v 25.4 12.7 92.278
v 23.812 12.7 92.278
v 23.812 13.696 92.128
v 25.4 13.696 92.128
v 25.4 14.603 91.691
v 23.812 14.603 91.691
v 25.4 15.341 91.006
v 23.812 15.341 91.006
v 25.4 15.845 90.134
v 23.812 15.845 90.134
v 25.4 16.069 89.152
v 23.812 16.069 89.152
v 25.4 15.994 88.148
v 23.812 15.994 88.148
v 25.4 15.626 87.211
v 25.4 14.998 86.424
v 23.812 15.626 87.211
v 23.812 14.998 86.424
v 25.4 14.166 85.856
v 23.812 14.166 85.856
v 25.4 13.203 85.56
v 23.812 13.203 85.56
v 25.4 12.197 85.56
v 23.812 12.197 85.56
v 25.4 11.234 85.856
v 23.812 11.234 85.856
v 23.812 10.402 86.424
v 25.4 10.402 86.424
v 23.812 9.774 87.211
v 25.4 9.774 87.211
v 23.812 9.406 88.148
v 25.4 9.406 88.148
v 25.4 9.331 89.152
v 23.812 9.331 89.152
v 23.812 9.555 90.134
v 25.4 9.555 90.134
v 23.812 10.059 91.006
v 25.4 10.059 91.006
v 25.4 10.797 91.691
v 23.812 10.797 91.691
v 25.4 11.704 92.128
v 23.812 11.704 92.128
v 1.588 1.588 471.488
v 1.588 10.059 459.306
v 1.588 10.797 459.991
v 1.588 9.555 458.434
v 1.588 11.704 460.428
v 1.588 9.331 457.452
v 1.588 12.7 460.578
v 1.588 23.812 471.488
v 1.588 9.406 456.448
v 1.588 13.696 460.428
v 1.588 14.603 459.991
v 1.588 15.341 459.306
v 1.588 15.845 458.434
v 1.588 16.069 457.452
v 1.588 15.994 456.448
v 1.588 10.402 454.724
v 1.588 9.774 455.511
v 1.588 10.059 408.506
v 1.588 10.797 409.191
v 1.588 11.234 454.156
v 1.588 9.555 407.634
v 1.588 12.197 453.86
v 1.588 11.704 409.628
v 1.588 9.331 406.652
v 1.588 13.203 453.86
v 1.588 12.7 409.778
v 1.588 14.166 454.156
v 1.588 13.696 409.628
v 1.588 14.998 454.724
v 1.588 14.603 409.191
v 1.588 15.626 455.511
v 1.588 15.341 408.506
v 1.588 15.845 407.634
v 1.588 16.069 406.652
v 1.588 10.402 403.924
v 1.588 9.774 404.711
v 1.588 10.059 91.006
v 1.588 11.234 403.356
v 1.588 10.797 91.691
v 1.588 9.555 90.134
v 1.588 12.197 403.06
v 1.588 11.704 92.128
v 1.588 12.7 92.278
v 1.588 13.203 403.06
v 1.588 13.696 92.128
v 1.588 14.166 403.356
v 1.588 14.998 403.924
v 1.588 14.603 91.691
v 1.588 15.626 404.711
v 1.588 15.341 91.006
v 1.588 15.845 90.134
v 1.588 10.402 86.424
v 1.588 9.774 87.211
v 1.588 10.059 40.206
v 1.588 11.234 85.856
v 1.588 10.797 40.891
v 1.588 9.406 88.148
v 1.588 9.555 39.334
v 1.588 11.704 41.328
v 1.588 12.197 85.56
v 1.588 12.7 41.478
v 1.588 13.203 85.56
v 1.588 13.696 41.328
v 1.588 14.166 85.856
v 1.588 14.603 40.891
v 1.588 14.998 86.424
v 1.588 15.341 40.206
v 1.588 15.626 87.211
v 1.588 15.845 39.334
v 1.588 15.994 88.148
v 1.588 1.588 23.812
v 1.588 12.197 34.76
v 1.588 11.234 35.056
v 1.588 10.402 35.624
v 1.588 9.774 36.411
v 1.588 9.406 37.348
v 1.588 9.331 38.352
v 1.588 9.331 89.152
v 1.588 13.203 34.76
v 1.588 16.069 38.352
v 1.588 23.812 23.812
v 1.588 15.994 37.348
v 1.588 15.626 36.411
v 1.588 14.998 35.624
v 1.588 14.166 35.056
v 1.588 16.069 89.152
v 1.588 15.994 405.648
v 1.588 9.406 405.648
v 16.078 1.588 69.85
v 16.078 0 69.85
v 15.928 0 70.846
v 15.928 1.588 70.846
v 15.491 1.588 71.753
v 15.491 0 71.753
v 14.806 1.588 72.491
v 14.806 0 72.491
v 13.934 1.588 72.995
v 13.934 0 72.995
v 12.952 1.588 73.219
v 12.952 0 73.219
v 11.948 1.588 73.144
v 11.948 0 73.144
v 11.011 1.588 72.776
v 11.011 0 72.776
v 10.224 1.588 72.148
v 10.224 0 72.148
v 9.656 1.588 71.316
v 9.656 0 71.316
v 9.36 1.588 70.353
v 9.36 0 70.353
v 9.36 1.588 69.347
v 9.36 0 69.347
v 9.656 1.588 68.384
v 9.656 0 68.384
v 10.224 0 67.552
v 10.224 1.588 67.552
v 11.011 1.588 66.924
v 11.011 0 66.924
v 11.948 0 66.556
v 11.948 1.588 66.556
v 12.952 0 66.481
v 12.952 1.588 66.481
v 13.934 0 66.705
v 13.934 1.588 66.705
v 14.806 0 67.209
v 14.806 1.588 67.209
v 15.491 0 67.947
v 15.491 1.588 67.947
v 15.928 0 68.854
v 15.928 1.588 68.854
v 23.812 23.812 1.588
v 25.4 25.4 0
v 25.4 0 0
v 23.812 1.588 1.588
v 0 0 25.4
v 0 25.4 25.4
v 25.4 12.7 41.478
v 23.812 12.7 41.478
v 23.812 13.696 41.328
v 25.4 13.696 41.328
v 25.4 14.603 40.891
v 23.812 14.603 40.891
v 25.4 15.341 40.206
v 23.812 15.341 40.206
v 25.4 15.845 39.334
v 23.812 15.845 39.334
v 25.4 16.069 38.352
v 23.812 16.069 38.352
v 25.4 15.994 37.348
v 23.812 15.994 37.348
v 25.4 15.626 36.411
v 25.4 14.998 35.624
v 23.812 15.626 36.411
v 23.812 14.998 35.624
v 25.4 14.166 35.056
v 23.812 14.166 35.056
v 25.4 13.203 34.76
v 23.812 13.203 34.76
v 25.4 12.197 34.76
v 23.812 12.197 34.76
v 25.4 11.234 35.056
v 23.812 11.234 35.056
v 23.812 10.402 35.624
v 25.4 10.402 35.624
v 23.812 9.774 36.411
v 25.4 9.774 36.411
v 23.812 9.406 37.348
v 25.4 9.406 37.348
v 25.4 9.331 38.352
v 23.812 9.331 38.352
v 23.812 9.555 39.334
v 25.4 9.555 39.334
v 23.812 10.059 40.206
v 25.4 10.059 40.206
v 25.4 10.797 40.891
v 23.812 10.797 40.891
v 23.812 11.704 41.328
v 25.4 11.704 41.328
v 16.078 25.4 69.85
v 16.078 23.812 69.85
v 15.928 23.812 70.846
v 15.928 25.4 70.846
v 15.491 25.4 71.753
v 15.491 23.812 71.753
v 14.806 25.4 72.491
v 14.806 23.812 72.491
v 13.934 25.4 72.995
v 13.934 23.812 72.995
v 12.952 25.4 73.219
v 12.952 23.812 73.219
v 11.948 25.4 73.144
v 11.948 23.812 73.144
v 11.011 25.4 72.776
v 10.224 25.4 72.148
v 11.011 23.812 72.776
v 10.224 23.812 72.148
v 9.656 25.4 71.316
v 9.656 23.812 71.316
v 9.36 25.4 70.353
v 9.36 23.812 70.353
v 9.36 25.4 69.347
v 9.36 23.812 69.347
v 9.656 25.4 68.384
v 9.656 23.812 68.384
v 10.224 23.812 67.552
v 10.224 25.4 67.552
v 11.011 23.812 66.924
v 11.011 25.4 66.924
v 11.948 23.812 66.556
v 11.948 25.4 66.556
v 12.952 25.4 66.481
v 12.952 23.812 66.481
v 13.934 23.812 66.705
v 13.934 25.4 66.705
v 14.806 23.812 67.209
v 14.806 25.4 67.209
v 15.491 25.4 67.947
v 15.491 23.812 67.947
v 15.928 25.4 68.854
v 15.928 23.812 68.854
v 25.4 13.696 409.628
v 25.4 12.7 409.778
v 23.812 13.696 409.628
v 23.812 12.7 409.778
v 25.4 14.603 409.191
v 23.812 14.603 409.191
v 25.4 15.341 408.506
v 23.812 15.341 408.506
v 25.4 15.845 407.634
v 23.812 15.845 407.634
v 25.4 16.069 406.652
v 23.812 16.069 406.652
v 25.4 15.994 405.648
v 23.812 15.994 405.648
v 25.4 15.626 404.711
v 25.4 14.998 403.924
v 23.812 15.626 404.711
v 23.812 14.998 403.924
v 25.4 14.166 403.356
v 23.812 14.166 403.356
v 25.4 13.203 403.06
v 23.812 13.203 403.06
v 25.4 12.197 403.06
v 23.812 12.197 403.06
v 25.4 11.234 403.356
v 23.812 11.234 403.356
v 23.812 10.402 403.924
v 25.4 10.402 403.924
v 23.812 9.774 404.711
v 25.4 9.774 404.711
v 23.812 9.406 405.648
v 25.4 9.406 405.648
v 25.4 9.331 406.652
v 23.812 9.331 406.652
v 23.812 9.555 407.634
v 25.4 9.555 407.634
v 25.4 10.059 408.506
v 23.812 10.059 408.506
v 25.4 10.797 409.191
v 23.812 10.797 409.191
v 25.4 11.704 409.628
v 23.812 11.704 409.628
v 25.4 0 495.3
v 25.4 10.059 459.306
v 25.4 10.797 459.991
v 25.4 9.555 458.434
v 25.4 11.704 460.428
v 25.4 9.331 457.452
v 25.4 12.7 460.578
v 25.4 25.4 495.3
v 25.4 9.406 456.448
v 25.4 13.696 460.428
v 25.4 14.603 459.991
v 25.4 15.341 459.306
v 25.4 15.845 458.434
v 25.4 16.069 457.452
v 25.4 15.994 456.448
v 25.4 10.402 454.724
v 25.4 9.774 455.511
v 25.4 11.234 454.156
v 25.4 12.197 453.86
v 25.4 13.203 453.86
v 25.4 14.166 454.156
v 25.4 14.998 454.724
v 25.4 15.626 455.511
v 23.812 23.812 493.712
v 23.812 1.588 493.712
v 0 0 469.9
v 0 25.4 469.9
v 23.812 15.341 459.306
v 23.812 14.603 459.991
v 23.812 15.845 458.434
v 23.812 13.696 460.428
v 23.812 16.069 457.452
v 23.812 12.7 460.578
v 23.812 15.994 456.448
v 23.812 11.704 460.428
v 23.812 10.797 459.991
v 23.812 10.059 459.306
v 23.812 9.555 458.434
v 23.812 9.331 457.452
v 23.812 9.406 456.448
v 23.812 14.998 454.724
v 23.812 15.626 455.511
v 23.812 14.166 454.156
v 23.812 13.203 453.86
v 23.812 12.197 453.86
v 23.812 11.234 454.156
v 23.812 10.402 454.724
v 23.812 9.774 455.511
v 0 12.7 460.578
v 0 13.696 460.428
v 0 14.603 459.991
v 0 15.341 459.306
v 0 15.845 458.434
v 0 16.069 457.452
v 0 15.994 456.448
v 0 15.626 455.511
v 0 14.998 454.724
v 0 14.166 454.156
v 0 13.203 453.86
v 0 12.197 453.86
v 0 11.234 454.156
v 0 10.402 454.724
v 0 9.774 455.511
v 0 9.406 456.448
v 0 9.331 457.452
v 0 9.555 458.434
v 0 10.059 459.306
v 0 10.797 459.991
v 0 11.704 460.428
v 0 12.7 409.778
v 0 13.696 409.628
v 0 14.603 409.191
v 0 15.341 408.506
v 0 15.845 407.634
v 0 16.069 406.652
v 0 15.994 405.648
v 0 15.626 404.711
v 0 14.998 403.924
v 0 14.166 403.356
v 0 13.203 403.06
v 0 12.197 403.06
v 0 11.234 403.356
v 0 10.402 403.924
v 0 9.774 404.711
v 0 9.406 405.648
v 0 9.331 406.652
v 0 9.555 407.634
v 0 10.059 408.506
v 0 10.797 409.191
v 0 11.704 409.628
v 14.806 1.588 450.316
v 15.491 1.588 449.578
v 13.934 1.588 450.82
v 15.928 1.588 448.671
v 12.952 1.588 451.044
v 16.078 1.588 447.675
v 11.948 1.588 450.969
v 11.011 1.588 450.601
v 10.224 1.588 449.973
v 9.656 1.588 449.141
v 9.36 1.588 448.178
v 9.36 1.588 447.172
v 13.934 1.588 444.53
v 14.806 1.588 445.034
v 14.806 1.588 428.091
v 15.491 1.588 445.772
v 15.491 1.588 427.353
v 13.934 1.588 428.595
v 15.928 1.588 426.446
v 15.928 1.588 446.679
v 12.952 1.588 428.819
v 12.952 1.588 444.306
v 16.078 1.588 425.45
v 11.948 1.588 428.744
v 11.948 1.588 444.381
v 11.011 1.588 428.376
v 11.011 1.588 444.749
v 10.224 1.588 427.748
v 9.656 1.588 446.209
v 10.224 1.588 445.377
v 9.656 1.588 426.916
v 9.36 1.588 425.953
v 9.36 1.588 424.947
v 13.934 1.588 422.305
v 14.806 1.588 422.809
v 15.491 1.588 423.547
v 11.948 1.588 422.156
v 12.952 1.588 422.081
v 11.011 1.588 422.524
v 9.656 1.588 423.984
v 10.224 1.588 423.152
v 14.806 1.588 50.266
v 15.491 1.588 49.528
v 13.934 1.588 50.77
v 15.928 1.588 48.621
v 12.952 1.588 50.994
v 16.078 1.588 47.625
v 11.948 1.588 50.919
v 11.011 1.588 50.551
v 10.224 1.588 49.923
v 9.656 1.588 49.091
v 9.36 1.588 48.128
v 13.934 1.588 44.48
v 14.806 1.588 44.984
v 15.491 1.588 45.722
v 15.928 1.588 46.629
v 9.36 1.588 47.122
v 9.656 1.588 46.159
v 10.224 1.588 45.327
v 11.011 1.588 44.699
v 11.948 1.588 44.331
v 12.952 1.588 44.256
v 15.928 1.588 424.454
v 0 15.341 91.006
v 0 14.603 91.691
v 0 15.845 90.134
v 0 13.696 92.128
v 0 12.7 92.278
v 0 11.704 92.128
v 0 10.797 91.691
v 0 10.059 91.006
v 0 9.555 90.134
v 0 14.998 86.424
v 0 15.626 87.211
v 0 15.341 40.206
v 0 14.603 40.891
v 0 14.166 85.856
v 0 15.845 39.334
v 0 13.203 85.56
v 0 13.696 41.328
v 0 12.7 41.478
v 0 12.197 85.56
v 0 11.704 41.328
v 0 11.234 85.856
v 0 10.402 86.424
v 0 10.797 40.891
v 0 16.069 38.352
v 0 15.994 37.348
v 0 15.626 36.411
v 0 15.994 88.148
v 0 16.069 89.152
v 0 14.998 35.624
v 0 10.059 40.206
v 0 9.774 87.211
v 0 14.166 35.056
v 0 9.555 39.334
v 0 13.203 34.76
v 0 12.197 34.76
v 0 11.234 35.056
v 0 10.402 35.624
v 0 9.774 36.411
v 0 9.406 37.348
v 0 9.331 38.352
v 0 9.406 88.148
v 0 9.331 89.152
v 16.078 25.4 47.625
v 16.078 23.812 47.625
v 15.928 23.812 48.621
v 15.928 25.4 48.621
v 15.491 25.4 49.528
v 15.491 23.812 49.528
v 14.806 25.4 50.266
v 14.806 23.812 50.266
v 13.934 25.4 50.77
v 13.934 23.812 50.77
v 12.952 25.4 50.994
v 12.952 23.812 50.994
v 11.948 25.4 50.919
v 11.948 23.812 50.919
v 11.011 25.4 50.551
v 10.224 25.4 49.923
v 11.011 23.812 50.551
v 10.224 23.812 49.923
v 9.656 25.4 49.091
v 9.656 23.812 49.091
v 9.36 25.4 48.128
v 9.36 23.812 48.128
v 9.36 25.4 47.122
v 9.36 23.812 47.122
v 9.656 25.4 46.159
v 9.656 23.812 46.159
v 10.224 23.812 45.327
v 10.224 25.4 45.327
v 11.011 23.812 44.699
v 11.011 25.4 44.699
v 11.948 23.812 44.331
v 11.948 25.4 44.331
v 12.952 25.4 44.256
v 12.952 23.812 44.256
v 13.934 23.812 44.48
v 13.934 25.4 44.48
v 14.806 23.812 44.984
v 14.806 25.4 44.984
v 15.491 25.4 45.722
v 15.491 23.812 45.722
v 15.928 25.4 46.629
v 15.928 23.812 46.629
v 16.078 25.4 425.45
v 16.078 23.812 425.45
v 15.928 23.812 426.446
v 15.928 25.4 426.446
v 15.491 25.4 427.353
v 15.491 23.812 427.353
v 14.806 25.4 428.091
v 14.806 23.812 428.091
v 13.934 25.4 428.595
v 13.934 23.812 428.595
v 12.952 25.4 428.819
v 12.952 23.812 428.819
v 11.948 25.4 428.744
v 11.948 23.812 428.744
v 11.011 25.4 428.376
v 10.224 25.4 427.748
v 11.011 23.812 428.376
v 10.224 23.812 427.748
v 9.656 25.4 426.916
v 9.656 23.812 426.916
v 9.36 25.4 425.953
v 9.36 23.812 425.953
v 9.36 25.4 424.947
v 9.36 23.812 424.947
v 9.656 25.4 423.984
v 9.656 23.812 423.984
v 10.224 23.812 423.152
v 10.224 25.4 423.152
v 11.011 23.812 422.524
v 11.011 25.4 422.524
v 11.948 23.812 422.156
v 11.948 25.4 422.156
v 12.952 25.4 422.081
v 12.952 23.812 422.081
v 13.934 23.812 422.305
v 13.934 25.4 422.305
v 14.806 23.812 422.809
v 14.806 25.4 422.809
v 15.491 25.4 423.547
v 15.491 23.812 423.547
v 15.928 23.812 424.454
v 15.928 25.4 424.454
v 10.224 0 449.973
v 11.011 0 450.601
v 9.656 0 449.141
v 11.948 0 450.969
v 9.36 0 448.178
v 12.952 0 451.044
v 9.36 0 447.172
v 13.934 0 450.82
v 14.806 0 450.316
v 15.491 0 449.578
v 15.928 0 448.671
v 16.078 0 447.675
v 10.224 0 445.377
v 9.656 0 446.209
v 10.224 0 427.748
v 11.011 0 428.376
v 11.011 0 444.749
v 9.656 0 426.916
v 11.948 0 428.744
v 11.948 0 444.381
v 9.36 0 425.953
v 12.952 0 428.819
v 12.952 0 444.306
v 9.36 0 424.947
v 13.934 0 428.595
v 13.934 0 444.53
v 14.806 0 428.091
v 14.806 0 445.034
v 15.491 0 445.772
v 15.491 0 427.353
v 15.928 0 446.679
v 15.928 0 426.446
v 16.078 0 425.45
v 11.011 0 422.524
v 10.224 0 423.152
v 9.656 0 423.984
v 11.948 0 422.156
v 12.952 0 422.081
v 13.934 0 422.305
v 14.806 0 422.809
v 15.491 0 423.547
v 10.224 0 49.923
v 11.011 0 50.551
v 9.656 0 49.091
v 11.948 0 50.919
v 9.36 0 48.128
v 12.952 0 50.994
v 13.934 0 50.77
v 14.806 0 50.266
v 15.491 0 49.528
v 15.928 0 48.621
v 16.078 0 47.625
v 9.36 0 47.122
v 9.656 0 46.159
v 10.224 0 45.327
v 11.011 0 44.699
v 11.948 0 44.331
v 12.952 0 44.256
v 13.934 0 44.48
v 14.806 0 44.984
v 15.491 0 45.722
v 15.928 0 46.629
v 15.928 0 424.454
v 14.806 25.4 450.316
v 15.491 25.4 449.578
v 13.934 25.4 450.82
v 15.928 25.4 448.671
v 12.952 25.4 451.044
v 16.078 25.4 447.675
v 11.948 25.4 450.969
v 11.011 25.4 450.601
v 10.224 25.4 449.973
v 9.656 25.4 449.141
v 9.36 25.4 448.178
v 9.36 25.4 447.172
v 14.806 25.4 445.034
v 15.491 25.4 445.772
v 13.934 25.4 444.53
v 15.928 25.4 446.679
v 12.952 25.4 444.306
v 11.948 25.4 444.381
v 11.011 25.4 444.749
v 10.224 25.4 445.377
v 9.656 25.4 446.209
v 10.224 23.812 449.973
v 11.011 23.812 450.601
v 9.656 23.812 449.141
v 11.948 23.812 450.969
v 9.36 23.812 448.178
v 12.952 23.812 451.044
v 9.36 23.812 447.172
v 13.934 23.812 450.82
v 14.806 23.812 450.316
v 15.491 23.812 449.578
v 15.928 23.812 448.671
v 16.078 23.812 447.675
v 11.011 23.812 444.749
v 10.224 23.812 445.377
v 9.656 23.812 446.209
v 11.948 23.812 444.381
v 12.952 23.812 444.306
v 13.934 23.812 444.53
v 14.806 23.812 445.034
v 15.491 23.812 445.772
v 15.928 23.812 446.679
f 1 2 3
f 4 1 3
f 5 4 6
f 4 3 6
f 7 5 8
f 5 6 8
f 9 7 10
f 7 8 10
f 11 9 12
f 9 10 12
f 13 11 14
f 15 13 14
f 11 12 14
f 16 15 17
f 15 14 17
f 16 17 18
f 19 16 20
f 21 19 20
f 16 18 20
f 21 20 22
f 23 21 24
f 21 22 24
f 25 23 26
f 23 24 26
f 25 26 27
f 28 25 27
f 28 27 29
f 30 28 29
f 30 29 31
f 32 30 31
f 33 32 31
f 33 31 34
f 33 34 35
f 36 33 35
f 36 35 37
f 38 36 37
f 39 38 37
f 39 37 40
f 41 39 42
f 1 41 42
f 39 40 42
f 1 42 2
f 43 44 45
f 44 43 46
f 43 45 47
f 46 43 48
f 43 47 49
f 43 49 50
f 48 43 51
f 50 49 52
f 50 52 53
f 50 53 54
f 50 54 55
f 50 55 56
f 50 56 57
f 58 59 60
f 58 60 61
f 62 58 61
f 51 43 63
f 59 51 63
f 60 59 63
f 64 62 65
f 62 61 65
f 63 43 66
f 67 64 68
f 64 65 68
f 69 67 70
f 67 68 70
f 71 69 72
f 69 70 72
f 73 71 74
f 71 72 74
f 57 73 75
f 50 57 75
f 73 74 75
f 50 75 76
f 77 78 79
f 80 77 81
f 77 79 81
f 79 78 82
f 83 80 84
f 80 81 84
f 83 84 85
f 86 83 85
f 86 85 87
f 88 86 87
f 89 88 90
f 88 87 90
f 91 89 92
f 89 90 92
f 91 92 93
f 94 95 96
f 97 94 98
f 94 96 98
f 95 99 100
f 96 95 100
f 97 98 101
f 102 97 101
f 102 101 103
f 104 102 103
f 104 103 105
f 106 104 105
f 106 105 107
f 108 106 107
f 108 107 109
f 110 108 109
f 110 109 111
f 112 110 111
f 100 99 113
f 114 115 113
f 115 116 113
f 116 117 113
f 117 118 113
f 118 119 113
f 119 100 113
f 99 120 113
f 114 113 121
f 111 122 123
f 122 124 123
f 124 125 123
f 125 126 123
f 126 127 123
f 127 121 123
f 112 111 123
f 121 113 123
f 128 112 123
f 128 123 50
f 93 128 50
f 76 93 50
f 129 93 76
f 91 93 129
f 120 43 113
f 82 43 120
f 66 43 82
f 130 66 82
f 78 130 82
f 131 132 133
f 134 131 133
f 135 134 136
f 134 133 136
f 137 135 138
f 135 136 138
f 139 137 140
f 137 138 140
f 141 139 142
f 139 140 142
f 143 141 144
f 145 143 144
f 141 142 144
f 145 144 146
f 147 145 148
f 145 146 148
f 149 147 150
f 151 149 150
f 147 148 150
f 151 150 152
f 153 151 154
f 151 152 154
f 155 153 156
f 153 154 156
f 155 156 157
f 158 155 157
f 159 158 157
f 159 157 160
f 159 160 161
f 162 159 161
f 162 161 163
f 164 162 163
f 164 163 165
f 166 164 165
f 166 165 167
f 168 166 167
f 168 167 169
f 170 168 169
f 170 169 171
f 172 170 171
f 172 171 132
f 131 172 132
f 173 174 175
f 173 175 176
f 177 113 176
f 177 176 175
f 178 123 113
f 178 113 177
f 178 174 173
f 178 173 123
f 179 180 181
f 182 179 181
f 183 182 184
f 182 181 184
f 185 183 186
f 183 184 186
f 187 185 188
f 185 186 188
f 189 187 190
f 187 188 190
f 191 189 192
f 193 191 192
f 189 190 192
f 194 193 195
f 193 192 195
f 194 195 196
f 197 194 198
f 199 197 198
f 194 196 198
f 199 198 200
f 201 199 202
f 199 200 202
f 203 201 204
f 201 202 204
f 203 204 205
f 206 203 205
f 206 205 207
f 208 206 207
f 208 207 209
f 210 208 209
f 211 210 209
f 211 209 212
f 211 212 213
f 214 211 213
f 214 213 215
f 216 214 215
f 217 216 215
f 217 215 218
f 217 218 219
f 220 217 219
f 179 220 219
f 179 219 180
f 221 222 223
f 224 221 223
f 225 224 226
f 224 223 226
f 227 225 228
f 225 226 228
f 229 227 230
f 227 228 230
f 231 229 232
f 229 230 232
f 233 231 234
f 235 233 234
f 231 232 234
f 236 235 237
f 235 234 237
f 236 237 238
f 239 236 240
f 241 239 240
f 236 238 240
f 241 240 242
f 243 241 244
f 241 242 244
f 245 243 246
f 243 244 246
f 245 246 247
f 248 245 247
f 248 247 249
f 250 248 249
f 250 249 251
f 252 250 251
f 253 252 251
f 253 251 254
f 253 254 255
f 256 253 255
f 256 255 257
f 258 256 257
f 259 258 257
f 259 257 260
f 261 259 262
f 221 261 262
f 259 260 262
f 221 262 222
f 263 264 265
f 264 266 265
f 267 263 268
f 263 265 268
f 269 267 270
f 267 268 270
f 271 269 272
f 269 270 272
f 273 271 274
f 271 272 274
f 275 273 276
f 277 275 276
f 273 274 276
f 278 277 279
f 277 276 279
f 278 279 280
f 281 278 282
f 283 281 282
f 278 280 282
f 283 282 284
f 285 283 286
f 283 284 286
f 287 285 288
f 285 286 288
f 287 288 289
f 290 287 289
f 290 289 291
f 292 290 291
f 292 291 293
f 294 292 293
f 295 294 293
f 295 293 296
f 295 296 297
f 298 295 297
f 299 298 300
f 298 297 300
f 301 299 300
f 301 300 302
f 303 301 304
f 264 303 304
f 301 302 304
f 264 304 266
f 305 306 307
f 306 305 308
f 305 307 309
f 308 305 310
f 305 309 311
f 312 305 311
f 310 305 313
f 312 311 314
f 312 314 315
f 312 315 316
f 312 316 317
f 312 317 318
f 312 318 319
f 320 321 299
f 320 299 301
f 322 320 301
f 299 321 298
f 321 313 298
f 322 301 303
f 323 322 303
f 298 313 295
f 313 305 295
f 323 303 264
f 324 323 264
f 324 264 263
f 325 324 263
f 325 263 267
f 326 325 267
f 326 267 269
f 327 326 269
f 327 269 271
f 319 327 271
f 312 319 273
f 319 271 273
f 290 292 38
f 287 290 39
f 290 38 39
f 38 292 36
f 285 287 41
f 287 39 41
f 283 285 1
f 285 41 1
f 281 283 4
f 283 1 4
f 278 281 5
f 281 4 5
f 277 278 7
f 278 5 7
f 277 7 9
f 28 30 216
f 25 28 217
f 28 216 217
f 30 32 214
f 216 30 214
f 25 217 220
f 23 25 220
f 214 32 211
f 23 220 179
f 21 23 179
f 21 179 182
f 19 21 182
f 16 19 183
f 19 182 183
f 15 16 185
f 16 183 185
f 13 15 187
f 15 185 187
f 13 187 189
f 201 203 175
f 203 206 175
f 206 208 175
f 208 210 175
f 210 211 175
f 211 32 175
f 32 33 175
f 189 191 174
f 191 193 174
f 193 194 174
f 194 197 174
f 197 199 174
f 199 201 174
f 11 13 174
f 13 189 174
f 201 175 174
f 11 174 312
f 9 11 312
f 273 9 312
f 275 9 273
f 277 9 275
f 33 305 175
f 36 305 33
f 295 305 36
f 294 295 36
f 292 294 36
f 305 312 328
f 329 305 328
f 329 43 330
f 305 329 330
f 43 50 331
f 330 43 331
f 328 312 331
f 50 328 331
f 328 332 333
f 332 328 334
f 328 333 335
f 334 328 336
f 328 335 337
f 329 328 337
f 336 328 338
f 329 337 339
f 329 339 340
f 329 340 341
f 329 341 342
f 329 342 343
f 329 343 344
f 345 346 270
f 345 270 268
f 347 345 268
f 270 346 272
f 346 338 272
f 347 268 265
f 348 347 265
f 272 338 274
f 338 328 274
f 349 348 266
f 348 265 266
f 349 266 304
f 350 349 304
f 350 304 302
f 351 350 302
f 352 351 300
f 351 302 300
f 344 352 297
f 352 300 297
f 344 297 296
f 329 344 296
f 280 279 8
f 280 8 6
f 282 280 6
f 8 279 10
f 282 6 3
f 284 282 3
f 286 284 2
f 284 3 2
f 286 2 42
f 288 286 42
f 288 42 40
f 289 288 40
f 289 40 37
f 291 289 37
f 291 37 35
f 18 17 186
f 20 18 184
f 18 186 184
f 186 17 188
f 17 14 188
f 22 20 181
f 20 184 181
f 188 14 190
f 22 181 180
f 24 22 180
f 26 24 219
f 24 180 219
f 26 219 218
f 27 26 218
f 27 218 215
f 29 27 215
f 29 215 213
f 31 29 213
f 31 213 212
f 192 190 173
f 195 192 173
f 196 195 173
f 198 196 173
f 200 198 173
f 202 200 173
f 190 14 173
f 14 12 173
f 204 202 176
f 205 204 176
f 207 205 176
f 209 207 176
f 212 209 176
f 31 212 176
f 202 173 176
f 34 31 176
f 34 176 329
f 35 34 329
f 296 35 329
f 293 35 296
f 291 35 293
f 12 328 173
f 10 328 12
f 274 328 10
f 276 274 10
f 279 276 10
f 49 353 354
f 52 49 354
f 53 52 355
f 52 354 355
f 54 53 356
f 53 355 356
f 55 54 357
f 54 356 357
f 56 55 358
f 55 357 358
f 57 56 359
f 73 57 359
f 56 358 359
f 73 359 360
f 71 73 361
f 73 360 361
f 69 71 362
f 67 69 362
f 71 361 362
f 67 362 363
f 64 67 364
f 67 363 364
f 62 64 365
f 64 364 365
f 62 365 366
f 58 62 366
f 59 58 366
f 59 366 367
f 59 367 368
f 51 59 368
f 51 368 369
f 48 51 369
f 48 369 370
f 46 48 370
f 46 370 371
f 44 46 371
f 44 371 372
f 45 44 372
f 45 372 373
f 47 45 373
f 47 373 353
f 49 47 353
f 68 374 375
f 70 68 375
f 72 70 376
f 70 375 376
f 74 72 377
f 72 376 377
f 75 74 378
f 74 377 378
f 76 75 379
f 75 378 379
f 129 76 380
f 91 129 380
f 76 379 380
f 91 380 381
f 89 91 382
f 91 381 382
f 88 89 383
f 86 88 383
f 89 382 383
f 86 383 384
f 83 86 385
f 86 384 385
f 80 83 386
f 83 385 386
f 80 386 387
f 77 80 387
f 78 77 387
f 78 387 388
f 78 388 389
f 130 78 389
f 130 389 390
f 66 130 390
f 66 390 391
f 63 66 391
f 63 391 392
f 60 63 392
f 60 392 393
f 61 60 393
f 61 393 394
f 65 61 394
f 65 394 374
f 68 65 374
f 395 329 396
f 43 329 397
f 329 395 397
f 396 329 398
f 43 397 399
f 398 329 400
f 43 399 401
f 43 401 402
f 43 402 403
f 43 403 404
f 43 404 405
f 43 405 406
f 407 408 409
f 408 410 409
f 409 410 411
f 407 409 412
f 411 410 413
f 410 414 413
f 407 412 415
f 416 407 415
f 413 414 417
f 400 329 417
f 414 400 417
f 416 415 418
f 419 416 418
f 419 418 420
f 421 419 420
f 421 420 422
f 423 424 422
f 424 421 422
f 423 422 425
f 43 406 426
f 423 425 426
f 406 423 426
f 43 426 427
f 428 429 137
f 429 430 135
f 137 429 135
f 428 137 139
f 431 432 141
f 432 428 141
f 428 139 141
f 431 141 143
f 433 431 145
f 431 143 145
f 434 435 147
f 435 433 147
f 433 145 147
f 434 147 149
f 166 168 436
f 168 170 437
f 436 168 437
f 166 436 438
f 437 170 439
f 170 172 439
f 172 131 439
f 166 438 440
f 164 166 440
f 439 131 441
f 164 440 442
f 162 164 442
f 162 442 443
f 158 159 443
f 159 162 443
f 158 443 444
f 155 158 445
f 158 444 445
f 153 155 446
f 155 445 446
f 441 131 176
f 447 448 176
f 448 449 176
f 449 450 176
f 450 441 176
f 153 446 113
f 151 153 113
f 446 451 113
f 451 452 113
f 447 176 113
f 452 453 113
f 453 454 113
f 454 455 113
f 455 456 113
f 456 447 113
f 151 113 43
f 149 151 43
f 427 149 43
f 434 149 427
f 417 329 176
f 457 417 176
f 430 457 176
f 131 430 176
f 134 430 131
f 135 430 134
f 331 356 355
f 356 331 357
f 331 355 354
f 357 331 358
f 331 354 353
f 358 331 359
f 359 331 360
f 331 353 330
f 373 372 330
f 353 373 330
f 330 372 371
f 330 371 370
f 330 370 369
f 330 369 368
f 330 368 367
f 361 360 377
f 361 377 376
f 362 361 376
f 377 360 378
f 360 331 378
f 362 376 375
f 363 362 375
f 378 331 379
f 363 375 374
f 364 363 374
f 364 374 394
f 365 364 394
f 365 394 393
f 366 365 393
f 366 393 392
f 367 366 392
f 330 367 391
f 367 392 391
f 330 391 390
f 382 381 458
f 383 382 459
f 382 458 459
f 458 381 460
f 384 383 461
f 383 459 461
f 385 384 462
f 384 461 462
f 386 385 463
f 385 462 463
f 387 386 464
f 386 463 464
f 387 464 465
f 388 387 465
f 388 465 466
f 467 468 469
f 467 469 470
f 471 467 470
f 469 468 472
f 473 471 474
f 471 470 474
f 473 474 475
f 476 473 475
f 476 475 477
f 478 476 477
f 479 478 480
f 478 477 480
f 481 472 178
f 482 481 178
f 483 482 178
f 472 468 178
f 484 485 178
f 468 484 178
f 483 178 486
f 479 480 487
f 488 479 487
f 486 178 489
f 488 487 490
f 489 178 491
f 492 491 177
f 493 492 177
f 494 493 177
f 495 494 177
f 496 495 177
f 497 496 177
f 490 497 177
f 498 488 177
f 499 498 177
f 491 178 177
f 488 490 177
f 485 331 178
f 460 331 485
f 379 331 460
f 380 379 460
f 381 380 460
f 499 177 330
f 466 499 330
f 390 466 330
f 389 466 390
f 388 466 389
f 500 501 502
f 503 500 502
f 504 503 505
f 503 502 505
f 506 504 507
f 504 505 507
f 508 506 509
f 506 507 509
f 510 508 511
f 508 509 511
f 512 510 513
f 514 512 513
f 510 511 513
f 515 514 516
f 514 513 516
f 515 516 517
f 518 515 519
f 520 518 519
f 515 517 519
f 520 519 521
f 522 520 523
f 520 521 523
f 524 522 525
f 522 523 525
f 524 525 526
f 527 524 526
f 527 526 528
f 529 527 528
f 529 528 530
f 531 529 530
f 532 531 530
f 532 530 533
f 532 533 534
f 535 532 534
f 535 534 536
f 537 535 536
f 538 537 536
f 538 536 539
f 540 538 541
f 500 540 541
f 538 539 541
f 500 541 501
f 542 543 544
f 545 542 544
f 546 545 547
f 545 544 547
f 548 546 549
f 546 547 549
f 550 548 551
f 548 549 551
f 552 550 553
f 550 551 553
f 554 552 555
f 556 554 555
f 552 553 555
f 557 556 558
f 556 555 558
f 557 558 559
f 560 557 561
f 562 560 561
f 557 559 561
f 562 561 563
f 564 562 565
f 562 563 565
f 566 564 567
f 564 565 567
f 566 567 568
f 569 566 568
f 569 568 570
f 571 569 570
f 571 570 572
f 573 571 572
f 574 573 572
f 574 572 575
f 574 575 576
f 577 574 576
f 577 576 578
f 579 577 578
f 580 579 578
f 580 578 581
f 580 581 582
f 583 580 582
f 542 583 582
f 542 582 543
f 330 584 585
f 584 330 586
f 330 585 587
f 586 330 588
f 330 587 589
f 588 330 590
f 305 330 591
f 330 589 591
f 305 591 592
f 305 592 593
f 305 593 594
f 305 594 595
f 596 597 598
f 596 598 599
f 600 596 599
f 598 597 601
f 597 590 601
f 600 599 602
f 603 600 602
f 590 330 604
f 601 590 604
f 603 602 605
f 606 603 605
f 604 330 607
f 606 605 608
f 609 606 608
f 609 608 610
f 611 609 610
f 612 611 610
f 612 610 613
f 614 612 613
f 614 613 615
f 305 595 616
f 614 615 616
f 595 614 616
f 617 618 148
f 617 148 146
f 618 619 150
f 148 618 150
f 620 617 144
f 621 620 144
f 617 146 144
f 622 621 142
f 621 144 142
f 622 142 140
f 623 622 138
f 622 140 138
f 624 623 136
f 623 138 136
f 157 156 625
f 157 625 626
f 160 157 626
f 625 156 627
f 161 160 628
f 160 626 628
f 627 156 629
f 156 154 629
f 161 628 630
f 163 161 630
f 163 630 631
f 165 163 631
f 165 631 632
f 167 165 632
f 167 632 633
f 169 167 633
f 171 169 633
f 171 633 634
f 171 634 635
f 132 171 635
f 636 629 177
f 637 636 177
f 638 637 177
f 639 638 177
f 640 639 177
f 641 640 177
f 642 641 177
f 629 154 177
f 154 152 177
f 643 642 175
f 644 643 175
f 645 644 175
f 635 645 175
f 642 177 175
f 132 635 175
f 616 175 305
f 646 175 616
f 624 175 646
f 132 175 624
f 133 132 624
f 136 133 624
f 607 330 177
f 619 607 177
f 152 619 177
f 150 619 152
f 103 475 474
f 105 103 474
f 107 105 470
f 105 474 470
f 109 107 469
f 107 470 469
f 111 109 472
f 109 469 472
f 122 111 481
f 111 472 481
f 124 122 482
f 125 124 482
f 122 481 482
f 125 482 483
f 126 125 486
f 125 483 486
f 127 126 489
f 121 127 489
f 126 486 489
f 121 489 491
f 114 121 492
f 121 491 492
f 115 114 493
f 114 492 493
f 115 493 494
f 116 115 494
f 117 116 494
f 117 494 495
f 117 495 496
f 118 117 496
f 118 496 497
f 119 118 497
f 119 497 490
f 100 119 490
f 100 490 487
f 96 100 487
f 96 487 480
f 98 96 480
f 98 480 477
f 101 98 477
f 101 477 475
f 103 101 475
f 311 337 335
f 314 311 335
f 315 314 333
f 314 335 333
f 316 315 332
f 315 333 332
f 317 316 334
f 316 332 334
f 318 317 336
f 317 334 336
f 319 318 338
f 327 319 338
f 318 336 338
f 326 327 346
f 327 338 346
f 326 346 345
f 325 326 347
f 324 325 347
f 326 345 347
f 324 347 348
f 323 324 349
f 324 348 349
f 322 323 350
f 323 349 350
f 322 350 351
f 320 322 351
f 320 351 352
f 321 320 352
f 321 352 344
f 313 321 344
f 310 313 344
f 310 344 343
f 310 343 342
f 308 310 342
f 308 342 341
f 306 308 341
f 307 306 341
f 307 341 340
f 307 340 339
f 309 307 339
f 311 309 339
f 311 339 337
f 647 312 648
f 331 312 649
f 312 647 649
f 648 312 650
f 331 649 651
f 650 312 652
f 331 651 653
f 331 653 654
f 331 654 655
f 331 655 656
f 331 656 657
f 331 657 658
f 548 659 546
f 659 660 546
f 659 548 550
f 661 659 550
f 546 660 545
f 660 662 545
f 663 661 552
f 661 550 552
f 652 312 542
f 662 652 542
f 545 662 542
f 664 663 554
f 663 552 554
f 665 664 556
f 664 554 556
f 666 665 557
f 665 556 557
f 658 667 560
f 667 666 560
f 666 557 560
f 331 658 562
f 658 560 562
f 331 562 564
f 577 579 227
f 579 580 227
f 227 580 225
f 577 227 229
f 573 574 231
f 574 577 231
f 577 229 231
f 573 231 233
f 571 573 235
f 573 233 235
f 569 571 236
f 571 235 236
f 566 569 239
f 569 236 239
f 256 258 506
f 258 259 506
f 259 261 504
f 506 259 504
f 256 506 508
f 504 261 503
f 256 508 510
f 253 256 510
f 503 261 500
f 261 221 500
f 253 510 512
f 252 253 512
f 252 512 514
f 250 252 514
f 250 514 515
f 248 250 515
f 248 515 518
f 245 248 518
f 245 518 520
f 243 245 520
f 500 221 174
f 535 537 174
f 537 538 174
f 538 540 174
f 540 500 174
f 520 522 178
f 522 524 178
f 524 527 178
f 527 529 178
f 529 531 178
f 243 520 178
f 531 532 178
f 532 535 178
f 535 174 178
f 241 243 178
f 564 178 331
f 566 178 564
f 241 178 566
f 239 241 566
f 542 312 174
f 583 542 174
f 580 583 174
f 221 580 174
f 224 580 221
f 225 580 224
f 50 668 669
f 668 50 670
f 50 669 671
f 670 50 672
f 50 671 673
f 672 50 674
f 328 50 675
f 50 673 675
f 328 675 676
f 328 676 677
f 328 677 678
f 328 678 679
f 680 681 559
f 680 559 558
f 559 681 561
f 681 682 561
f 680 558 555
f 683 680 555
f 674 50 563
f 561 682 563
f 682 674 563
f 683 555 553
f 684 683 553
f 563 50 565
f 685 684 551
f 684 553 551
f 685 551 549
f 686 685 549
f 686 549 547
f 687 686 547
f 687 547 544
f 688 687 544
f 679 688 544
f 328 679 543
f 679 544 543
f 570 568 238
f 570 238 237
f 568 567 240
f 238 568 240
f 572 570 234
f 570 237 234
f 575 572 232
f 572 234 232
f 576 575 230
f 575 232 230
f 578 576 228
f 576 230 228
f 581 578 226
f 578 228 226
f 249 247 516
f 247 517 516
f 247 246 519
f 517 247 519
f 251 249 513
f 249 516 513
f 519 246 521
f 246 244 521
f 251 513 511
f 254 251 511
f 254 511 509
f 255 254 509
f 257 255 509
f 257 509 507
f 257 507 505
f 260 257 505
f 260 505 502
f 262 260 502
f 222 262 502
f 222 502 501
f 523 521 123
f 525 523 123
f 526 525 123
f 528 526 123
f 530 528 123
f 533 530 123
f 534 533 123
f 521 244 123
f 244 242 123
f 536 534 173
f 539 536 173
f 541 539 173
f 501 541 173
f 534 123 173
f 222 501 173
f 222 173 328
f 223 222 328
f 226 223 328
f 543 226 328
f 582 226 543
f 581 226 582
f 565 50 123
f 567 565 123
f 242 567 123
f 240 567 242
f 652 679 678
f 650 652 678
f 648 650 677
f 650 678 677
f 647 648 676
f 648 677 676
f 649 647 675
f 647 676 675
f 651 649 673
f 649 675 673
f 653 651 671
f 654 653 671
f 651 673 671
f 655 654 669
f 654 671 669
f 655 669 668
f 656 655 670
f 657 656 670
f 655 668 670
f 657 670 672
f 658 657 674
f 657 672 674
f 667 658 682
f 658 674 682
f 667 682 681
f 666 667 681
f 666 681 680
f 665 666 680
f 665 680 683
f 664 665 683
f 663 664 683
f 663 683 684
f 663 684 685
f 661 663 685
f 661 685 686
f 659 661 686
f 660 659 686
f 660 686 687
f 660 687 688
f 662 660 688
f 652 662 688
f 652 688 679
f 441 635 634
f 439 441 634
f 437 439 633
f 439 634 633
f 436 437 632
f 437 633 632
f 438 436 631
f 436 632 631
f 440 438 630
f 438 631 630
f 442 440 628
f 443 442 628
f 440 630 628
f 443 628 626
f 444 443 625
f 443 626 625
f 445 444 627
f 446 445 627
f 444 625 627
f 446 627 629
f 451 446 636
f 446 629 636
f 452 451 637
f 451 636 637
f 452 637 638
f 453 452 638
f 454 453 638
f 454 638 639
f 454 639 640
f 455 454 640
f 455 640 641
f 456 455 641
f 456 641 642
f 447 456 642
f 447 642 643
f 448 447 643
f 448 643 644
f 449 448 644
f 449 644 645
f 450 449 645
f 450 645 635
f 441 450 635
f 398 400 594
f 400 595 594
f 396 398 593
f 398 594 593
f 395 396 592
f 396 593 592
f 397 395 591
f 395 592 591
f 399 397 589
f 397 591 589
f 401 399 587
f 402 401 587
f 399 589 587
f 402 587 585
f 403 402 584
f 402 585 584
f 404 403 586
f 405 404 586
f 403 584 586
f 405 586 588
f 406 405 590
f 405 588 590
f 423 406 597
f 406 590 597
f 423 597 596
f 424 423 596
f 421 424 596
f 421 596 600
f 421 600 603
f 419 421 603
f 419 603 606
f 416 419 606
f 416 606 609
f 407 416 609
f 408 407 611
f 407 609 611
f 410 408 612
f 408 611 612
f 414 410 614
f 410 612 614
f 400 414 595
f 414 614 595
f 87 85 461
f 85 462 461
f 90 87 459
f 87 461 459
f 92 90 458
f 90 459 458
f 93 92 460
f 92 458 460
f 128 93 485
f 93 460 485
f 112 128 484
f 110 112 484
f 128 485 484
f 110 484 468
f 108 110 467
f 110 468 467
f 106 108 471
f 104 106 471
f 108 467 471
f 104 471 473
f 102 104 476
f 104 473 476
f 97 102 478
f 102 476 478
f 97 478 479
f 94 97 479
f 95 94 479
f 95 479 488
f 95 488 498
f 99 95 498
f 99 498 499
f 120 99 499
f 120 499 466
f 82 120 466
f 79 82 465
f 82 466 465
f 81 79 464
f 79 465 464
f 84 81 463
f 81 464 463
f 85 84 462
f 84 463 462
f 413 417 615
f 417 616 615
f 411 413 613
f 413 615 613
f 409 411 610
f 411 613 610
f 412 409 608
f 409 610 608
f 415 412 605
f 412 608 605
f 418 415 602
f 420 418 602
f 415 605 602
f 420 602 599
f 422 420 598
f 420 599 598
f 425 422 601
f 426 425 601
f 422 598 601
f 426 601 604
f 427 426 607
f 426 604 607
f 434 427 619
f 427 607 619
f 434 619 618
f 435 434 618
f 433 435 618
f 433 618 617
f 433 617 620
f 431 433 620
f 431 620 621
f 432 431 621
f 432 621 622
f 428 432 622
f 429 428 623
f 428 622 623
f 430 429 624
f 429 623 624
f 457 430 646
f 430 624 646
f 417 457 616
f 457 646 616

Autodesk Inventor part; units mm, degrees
ref_plane "YZ Plane" through (0, 0, 0) normal (1, 0, 0) x (0, 1, 0)
ref_plane "XZ Plane" through (0, 0, 0) normal (0, 1, 0) x (-1, 0, 0)
ref_plane "XY Plane" through (0, 0, 0) normal (0, 0, 1) x (1, 0, 0)
sketch "Sketch1" plane through (0, 0, 0) normal (0, 0, 1) x (1, 0, 0)
  line L0 (0, 0) -> (25.4, 0)
  line L1 (25.4, 0) -> (25.4, 25.4)
  line L2 (25.4, 25.4) -> (0, 25.4)
  line L3 (0, 25.4) -> (0, 0)
  line L4 (1.5875, 23.8125) -> (23.8125, 23.8125)
  line L5 (23.8125, 23.8125) -> (23.8125, 1.5875)
  line L6 (23.8125, 1.5875) -> (1.5875, 1.5875)
  line L7 (1.5875, 1.5875) -> (1.5875, 23.8125)
  dimension "d0" = 25.4
  dimension "d2" = 25.4
  dimension "d3" = 1.5875
extrude "Extrusion1" add sketch "Sketch1" along normal blind 495.3
sketch "Sketch2" plane through (0, 25.4, 0) normal (0, 1, 0) x (1, 0, 0)
  line L0 (25.4, 0) -> (0, 0) projected
  line L1 (0, 0) -> (0, -495.3) projected
  line L2 (25.4, -495.3) -> (0, -495.3) projected
  line L3 (25.4, 0) -> (25.4, -495.3) projected
  line L4 (25.4, -495.3) -> (0, -469.9)
  line L5 (25.4, 0) -> (0, -25.4)
  dimension "d6" = 135
  dimension "d7" = 45
extrude "Extrusion2" cut sketch "Sketch2" against normal blind 495.3 contours L5 L1 L0 | L2 L1 L4
sketch "Sketch3" plane through (25.4, 0, 0) normal (0, -1, 0) x (1, 0, 0)
  circle A0 centre (-12.7, 69.85) radius 3.3782 projected
  circle A1 centre (-12.7, 47.625) radius 3.3782 projected
  circle A2 centre (-12.7, 425.45) radius 3.3782 projected
  circle A3 centre (-12.7, 447.675) radius 3.3782 projected
  point P0 (-25.4, 0)
extrude "Extrusion3" cut sketch "Sketch3" against normal blind 25.4
sketch "Sketch4" plane through (0, 0, 25.4) normal (-1, 0, 0) x (0, 0, 1)
  circle A0 centre (431.8, 12.7) radius 3.3782 projected
  circle A1 centre (381, 12.7) radius 3.3782 projected
  circle A2 centre (12.7, 12.7) radius 3.3782 projected
  circle A3 centre (63.5, 12.7) radius 3.3782 projected
  point P0 (-25.4, 0)
extrude "Extrusion4" cut sketch "Sketch4" against normal blind 25.4
properties part number "Square Tube 2" material "Aluminum 6061"
